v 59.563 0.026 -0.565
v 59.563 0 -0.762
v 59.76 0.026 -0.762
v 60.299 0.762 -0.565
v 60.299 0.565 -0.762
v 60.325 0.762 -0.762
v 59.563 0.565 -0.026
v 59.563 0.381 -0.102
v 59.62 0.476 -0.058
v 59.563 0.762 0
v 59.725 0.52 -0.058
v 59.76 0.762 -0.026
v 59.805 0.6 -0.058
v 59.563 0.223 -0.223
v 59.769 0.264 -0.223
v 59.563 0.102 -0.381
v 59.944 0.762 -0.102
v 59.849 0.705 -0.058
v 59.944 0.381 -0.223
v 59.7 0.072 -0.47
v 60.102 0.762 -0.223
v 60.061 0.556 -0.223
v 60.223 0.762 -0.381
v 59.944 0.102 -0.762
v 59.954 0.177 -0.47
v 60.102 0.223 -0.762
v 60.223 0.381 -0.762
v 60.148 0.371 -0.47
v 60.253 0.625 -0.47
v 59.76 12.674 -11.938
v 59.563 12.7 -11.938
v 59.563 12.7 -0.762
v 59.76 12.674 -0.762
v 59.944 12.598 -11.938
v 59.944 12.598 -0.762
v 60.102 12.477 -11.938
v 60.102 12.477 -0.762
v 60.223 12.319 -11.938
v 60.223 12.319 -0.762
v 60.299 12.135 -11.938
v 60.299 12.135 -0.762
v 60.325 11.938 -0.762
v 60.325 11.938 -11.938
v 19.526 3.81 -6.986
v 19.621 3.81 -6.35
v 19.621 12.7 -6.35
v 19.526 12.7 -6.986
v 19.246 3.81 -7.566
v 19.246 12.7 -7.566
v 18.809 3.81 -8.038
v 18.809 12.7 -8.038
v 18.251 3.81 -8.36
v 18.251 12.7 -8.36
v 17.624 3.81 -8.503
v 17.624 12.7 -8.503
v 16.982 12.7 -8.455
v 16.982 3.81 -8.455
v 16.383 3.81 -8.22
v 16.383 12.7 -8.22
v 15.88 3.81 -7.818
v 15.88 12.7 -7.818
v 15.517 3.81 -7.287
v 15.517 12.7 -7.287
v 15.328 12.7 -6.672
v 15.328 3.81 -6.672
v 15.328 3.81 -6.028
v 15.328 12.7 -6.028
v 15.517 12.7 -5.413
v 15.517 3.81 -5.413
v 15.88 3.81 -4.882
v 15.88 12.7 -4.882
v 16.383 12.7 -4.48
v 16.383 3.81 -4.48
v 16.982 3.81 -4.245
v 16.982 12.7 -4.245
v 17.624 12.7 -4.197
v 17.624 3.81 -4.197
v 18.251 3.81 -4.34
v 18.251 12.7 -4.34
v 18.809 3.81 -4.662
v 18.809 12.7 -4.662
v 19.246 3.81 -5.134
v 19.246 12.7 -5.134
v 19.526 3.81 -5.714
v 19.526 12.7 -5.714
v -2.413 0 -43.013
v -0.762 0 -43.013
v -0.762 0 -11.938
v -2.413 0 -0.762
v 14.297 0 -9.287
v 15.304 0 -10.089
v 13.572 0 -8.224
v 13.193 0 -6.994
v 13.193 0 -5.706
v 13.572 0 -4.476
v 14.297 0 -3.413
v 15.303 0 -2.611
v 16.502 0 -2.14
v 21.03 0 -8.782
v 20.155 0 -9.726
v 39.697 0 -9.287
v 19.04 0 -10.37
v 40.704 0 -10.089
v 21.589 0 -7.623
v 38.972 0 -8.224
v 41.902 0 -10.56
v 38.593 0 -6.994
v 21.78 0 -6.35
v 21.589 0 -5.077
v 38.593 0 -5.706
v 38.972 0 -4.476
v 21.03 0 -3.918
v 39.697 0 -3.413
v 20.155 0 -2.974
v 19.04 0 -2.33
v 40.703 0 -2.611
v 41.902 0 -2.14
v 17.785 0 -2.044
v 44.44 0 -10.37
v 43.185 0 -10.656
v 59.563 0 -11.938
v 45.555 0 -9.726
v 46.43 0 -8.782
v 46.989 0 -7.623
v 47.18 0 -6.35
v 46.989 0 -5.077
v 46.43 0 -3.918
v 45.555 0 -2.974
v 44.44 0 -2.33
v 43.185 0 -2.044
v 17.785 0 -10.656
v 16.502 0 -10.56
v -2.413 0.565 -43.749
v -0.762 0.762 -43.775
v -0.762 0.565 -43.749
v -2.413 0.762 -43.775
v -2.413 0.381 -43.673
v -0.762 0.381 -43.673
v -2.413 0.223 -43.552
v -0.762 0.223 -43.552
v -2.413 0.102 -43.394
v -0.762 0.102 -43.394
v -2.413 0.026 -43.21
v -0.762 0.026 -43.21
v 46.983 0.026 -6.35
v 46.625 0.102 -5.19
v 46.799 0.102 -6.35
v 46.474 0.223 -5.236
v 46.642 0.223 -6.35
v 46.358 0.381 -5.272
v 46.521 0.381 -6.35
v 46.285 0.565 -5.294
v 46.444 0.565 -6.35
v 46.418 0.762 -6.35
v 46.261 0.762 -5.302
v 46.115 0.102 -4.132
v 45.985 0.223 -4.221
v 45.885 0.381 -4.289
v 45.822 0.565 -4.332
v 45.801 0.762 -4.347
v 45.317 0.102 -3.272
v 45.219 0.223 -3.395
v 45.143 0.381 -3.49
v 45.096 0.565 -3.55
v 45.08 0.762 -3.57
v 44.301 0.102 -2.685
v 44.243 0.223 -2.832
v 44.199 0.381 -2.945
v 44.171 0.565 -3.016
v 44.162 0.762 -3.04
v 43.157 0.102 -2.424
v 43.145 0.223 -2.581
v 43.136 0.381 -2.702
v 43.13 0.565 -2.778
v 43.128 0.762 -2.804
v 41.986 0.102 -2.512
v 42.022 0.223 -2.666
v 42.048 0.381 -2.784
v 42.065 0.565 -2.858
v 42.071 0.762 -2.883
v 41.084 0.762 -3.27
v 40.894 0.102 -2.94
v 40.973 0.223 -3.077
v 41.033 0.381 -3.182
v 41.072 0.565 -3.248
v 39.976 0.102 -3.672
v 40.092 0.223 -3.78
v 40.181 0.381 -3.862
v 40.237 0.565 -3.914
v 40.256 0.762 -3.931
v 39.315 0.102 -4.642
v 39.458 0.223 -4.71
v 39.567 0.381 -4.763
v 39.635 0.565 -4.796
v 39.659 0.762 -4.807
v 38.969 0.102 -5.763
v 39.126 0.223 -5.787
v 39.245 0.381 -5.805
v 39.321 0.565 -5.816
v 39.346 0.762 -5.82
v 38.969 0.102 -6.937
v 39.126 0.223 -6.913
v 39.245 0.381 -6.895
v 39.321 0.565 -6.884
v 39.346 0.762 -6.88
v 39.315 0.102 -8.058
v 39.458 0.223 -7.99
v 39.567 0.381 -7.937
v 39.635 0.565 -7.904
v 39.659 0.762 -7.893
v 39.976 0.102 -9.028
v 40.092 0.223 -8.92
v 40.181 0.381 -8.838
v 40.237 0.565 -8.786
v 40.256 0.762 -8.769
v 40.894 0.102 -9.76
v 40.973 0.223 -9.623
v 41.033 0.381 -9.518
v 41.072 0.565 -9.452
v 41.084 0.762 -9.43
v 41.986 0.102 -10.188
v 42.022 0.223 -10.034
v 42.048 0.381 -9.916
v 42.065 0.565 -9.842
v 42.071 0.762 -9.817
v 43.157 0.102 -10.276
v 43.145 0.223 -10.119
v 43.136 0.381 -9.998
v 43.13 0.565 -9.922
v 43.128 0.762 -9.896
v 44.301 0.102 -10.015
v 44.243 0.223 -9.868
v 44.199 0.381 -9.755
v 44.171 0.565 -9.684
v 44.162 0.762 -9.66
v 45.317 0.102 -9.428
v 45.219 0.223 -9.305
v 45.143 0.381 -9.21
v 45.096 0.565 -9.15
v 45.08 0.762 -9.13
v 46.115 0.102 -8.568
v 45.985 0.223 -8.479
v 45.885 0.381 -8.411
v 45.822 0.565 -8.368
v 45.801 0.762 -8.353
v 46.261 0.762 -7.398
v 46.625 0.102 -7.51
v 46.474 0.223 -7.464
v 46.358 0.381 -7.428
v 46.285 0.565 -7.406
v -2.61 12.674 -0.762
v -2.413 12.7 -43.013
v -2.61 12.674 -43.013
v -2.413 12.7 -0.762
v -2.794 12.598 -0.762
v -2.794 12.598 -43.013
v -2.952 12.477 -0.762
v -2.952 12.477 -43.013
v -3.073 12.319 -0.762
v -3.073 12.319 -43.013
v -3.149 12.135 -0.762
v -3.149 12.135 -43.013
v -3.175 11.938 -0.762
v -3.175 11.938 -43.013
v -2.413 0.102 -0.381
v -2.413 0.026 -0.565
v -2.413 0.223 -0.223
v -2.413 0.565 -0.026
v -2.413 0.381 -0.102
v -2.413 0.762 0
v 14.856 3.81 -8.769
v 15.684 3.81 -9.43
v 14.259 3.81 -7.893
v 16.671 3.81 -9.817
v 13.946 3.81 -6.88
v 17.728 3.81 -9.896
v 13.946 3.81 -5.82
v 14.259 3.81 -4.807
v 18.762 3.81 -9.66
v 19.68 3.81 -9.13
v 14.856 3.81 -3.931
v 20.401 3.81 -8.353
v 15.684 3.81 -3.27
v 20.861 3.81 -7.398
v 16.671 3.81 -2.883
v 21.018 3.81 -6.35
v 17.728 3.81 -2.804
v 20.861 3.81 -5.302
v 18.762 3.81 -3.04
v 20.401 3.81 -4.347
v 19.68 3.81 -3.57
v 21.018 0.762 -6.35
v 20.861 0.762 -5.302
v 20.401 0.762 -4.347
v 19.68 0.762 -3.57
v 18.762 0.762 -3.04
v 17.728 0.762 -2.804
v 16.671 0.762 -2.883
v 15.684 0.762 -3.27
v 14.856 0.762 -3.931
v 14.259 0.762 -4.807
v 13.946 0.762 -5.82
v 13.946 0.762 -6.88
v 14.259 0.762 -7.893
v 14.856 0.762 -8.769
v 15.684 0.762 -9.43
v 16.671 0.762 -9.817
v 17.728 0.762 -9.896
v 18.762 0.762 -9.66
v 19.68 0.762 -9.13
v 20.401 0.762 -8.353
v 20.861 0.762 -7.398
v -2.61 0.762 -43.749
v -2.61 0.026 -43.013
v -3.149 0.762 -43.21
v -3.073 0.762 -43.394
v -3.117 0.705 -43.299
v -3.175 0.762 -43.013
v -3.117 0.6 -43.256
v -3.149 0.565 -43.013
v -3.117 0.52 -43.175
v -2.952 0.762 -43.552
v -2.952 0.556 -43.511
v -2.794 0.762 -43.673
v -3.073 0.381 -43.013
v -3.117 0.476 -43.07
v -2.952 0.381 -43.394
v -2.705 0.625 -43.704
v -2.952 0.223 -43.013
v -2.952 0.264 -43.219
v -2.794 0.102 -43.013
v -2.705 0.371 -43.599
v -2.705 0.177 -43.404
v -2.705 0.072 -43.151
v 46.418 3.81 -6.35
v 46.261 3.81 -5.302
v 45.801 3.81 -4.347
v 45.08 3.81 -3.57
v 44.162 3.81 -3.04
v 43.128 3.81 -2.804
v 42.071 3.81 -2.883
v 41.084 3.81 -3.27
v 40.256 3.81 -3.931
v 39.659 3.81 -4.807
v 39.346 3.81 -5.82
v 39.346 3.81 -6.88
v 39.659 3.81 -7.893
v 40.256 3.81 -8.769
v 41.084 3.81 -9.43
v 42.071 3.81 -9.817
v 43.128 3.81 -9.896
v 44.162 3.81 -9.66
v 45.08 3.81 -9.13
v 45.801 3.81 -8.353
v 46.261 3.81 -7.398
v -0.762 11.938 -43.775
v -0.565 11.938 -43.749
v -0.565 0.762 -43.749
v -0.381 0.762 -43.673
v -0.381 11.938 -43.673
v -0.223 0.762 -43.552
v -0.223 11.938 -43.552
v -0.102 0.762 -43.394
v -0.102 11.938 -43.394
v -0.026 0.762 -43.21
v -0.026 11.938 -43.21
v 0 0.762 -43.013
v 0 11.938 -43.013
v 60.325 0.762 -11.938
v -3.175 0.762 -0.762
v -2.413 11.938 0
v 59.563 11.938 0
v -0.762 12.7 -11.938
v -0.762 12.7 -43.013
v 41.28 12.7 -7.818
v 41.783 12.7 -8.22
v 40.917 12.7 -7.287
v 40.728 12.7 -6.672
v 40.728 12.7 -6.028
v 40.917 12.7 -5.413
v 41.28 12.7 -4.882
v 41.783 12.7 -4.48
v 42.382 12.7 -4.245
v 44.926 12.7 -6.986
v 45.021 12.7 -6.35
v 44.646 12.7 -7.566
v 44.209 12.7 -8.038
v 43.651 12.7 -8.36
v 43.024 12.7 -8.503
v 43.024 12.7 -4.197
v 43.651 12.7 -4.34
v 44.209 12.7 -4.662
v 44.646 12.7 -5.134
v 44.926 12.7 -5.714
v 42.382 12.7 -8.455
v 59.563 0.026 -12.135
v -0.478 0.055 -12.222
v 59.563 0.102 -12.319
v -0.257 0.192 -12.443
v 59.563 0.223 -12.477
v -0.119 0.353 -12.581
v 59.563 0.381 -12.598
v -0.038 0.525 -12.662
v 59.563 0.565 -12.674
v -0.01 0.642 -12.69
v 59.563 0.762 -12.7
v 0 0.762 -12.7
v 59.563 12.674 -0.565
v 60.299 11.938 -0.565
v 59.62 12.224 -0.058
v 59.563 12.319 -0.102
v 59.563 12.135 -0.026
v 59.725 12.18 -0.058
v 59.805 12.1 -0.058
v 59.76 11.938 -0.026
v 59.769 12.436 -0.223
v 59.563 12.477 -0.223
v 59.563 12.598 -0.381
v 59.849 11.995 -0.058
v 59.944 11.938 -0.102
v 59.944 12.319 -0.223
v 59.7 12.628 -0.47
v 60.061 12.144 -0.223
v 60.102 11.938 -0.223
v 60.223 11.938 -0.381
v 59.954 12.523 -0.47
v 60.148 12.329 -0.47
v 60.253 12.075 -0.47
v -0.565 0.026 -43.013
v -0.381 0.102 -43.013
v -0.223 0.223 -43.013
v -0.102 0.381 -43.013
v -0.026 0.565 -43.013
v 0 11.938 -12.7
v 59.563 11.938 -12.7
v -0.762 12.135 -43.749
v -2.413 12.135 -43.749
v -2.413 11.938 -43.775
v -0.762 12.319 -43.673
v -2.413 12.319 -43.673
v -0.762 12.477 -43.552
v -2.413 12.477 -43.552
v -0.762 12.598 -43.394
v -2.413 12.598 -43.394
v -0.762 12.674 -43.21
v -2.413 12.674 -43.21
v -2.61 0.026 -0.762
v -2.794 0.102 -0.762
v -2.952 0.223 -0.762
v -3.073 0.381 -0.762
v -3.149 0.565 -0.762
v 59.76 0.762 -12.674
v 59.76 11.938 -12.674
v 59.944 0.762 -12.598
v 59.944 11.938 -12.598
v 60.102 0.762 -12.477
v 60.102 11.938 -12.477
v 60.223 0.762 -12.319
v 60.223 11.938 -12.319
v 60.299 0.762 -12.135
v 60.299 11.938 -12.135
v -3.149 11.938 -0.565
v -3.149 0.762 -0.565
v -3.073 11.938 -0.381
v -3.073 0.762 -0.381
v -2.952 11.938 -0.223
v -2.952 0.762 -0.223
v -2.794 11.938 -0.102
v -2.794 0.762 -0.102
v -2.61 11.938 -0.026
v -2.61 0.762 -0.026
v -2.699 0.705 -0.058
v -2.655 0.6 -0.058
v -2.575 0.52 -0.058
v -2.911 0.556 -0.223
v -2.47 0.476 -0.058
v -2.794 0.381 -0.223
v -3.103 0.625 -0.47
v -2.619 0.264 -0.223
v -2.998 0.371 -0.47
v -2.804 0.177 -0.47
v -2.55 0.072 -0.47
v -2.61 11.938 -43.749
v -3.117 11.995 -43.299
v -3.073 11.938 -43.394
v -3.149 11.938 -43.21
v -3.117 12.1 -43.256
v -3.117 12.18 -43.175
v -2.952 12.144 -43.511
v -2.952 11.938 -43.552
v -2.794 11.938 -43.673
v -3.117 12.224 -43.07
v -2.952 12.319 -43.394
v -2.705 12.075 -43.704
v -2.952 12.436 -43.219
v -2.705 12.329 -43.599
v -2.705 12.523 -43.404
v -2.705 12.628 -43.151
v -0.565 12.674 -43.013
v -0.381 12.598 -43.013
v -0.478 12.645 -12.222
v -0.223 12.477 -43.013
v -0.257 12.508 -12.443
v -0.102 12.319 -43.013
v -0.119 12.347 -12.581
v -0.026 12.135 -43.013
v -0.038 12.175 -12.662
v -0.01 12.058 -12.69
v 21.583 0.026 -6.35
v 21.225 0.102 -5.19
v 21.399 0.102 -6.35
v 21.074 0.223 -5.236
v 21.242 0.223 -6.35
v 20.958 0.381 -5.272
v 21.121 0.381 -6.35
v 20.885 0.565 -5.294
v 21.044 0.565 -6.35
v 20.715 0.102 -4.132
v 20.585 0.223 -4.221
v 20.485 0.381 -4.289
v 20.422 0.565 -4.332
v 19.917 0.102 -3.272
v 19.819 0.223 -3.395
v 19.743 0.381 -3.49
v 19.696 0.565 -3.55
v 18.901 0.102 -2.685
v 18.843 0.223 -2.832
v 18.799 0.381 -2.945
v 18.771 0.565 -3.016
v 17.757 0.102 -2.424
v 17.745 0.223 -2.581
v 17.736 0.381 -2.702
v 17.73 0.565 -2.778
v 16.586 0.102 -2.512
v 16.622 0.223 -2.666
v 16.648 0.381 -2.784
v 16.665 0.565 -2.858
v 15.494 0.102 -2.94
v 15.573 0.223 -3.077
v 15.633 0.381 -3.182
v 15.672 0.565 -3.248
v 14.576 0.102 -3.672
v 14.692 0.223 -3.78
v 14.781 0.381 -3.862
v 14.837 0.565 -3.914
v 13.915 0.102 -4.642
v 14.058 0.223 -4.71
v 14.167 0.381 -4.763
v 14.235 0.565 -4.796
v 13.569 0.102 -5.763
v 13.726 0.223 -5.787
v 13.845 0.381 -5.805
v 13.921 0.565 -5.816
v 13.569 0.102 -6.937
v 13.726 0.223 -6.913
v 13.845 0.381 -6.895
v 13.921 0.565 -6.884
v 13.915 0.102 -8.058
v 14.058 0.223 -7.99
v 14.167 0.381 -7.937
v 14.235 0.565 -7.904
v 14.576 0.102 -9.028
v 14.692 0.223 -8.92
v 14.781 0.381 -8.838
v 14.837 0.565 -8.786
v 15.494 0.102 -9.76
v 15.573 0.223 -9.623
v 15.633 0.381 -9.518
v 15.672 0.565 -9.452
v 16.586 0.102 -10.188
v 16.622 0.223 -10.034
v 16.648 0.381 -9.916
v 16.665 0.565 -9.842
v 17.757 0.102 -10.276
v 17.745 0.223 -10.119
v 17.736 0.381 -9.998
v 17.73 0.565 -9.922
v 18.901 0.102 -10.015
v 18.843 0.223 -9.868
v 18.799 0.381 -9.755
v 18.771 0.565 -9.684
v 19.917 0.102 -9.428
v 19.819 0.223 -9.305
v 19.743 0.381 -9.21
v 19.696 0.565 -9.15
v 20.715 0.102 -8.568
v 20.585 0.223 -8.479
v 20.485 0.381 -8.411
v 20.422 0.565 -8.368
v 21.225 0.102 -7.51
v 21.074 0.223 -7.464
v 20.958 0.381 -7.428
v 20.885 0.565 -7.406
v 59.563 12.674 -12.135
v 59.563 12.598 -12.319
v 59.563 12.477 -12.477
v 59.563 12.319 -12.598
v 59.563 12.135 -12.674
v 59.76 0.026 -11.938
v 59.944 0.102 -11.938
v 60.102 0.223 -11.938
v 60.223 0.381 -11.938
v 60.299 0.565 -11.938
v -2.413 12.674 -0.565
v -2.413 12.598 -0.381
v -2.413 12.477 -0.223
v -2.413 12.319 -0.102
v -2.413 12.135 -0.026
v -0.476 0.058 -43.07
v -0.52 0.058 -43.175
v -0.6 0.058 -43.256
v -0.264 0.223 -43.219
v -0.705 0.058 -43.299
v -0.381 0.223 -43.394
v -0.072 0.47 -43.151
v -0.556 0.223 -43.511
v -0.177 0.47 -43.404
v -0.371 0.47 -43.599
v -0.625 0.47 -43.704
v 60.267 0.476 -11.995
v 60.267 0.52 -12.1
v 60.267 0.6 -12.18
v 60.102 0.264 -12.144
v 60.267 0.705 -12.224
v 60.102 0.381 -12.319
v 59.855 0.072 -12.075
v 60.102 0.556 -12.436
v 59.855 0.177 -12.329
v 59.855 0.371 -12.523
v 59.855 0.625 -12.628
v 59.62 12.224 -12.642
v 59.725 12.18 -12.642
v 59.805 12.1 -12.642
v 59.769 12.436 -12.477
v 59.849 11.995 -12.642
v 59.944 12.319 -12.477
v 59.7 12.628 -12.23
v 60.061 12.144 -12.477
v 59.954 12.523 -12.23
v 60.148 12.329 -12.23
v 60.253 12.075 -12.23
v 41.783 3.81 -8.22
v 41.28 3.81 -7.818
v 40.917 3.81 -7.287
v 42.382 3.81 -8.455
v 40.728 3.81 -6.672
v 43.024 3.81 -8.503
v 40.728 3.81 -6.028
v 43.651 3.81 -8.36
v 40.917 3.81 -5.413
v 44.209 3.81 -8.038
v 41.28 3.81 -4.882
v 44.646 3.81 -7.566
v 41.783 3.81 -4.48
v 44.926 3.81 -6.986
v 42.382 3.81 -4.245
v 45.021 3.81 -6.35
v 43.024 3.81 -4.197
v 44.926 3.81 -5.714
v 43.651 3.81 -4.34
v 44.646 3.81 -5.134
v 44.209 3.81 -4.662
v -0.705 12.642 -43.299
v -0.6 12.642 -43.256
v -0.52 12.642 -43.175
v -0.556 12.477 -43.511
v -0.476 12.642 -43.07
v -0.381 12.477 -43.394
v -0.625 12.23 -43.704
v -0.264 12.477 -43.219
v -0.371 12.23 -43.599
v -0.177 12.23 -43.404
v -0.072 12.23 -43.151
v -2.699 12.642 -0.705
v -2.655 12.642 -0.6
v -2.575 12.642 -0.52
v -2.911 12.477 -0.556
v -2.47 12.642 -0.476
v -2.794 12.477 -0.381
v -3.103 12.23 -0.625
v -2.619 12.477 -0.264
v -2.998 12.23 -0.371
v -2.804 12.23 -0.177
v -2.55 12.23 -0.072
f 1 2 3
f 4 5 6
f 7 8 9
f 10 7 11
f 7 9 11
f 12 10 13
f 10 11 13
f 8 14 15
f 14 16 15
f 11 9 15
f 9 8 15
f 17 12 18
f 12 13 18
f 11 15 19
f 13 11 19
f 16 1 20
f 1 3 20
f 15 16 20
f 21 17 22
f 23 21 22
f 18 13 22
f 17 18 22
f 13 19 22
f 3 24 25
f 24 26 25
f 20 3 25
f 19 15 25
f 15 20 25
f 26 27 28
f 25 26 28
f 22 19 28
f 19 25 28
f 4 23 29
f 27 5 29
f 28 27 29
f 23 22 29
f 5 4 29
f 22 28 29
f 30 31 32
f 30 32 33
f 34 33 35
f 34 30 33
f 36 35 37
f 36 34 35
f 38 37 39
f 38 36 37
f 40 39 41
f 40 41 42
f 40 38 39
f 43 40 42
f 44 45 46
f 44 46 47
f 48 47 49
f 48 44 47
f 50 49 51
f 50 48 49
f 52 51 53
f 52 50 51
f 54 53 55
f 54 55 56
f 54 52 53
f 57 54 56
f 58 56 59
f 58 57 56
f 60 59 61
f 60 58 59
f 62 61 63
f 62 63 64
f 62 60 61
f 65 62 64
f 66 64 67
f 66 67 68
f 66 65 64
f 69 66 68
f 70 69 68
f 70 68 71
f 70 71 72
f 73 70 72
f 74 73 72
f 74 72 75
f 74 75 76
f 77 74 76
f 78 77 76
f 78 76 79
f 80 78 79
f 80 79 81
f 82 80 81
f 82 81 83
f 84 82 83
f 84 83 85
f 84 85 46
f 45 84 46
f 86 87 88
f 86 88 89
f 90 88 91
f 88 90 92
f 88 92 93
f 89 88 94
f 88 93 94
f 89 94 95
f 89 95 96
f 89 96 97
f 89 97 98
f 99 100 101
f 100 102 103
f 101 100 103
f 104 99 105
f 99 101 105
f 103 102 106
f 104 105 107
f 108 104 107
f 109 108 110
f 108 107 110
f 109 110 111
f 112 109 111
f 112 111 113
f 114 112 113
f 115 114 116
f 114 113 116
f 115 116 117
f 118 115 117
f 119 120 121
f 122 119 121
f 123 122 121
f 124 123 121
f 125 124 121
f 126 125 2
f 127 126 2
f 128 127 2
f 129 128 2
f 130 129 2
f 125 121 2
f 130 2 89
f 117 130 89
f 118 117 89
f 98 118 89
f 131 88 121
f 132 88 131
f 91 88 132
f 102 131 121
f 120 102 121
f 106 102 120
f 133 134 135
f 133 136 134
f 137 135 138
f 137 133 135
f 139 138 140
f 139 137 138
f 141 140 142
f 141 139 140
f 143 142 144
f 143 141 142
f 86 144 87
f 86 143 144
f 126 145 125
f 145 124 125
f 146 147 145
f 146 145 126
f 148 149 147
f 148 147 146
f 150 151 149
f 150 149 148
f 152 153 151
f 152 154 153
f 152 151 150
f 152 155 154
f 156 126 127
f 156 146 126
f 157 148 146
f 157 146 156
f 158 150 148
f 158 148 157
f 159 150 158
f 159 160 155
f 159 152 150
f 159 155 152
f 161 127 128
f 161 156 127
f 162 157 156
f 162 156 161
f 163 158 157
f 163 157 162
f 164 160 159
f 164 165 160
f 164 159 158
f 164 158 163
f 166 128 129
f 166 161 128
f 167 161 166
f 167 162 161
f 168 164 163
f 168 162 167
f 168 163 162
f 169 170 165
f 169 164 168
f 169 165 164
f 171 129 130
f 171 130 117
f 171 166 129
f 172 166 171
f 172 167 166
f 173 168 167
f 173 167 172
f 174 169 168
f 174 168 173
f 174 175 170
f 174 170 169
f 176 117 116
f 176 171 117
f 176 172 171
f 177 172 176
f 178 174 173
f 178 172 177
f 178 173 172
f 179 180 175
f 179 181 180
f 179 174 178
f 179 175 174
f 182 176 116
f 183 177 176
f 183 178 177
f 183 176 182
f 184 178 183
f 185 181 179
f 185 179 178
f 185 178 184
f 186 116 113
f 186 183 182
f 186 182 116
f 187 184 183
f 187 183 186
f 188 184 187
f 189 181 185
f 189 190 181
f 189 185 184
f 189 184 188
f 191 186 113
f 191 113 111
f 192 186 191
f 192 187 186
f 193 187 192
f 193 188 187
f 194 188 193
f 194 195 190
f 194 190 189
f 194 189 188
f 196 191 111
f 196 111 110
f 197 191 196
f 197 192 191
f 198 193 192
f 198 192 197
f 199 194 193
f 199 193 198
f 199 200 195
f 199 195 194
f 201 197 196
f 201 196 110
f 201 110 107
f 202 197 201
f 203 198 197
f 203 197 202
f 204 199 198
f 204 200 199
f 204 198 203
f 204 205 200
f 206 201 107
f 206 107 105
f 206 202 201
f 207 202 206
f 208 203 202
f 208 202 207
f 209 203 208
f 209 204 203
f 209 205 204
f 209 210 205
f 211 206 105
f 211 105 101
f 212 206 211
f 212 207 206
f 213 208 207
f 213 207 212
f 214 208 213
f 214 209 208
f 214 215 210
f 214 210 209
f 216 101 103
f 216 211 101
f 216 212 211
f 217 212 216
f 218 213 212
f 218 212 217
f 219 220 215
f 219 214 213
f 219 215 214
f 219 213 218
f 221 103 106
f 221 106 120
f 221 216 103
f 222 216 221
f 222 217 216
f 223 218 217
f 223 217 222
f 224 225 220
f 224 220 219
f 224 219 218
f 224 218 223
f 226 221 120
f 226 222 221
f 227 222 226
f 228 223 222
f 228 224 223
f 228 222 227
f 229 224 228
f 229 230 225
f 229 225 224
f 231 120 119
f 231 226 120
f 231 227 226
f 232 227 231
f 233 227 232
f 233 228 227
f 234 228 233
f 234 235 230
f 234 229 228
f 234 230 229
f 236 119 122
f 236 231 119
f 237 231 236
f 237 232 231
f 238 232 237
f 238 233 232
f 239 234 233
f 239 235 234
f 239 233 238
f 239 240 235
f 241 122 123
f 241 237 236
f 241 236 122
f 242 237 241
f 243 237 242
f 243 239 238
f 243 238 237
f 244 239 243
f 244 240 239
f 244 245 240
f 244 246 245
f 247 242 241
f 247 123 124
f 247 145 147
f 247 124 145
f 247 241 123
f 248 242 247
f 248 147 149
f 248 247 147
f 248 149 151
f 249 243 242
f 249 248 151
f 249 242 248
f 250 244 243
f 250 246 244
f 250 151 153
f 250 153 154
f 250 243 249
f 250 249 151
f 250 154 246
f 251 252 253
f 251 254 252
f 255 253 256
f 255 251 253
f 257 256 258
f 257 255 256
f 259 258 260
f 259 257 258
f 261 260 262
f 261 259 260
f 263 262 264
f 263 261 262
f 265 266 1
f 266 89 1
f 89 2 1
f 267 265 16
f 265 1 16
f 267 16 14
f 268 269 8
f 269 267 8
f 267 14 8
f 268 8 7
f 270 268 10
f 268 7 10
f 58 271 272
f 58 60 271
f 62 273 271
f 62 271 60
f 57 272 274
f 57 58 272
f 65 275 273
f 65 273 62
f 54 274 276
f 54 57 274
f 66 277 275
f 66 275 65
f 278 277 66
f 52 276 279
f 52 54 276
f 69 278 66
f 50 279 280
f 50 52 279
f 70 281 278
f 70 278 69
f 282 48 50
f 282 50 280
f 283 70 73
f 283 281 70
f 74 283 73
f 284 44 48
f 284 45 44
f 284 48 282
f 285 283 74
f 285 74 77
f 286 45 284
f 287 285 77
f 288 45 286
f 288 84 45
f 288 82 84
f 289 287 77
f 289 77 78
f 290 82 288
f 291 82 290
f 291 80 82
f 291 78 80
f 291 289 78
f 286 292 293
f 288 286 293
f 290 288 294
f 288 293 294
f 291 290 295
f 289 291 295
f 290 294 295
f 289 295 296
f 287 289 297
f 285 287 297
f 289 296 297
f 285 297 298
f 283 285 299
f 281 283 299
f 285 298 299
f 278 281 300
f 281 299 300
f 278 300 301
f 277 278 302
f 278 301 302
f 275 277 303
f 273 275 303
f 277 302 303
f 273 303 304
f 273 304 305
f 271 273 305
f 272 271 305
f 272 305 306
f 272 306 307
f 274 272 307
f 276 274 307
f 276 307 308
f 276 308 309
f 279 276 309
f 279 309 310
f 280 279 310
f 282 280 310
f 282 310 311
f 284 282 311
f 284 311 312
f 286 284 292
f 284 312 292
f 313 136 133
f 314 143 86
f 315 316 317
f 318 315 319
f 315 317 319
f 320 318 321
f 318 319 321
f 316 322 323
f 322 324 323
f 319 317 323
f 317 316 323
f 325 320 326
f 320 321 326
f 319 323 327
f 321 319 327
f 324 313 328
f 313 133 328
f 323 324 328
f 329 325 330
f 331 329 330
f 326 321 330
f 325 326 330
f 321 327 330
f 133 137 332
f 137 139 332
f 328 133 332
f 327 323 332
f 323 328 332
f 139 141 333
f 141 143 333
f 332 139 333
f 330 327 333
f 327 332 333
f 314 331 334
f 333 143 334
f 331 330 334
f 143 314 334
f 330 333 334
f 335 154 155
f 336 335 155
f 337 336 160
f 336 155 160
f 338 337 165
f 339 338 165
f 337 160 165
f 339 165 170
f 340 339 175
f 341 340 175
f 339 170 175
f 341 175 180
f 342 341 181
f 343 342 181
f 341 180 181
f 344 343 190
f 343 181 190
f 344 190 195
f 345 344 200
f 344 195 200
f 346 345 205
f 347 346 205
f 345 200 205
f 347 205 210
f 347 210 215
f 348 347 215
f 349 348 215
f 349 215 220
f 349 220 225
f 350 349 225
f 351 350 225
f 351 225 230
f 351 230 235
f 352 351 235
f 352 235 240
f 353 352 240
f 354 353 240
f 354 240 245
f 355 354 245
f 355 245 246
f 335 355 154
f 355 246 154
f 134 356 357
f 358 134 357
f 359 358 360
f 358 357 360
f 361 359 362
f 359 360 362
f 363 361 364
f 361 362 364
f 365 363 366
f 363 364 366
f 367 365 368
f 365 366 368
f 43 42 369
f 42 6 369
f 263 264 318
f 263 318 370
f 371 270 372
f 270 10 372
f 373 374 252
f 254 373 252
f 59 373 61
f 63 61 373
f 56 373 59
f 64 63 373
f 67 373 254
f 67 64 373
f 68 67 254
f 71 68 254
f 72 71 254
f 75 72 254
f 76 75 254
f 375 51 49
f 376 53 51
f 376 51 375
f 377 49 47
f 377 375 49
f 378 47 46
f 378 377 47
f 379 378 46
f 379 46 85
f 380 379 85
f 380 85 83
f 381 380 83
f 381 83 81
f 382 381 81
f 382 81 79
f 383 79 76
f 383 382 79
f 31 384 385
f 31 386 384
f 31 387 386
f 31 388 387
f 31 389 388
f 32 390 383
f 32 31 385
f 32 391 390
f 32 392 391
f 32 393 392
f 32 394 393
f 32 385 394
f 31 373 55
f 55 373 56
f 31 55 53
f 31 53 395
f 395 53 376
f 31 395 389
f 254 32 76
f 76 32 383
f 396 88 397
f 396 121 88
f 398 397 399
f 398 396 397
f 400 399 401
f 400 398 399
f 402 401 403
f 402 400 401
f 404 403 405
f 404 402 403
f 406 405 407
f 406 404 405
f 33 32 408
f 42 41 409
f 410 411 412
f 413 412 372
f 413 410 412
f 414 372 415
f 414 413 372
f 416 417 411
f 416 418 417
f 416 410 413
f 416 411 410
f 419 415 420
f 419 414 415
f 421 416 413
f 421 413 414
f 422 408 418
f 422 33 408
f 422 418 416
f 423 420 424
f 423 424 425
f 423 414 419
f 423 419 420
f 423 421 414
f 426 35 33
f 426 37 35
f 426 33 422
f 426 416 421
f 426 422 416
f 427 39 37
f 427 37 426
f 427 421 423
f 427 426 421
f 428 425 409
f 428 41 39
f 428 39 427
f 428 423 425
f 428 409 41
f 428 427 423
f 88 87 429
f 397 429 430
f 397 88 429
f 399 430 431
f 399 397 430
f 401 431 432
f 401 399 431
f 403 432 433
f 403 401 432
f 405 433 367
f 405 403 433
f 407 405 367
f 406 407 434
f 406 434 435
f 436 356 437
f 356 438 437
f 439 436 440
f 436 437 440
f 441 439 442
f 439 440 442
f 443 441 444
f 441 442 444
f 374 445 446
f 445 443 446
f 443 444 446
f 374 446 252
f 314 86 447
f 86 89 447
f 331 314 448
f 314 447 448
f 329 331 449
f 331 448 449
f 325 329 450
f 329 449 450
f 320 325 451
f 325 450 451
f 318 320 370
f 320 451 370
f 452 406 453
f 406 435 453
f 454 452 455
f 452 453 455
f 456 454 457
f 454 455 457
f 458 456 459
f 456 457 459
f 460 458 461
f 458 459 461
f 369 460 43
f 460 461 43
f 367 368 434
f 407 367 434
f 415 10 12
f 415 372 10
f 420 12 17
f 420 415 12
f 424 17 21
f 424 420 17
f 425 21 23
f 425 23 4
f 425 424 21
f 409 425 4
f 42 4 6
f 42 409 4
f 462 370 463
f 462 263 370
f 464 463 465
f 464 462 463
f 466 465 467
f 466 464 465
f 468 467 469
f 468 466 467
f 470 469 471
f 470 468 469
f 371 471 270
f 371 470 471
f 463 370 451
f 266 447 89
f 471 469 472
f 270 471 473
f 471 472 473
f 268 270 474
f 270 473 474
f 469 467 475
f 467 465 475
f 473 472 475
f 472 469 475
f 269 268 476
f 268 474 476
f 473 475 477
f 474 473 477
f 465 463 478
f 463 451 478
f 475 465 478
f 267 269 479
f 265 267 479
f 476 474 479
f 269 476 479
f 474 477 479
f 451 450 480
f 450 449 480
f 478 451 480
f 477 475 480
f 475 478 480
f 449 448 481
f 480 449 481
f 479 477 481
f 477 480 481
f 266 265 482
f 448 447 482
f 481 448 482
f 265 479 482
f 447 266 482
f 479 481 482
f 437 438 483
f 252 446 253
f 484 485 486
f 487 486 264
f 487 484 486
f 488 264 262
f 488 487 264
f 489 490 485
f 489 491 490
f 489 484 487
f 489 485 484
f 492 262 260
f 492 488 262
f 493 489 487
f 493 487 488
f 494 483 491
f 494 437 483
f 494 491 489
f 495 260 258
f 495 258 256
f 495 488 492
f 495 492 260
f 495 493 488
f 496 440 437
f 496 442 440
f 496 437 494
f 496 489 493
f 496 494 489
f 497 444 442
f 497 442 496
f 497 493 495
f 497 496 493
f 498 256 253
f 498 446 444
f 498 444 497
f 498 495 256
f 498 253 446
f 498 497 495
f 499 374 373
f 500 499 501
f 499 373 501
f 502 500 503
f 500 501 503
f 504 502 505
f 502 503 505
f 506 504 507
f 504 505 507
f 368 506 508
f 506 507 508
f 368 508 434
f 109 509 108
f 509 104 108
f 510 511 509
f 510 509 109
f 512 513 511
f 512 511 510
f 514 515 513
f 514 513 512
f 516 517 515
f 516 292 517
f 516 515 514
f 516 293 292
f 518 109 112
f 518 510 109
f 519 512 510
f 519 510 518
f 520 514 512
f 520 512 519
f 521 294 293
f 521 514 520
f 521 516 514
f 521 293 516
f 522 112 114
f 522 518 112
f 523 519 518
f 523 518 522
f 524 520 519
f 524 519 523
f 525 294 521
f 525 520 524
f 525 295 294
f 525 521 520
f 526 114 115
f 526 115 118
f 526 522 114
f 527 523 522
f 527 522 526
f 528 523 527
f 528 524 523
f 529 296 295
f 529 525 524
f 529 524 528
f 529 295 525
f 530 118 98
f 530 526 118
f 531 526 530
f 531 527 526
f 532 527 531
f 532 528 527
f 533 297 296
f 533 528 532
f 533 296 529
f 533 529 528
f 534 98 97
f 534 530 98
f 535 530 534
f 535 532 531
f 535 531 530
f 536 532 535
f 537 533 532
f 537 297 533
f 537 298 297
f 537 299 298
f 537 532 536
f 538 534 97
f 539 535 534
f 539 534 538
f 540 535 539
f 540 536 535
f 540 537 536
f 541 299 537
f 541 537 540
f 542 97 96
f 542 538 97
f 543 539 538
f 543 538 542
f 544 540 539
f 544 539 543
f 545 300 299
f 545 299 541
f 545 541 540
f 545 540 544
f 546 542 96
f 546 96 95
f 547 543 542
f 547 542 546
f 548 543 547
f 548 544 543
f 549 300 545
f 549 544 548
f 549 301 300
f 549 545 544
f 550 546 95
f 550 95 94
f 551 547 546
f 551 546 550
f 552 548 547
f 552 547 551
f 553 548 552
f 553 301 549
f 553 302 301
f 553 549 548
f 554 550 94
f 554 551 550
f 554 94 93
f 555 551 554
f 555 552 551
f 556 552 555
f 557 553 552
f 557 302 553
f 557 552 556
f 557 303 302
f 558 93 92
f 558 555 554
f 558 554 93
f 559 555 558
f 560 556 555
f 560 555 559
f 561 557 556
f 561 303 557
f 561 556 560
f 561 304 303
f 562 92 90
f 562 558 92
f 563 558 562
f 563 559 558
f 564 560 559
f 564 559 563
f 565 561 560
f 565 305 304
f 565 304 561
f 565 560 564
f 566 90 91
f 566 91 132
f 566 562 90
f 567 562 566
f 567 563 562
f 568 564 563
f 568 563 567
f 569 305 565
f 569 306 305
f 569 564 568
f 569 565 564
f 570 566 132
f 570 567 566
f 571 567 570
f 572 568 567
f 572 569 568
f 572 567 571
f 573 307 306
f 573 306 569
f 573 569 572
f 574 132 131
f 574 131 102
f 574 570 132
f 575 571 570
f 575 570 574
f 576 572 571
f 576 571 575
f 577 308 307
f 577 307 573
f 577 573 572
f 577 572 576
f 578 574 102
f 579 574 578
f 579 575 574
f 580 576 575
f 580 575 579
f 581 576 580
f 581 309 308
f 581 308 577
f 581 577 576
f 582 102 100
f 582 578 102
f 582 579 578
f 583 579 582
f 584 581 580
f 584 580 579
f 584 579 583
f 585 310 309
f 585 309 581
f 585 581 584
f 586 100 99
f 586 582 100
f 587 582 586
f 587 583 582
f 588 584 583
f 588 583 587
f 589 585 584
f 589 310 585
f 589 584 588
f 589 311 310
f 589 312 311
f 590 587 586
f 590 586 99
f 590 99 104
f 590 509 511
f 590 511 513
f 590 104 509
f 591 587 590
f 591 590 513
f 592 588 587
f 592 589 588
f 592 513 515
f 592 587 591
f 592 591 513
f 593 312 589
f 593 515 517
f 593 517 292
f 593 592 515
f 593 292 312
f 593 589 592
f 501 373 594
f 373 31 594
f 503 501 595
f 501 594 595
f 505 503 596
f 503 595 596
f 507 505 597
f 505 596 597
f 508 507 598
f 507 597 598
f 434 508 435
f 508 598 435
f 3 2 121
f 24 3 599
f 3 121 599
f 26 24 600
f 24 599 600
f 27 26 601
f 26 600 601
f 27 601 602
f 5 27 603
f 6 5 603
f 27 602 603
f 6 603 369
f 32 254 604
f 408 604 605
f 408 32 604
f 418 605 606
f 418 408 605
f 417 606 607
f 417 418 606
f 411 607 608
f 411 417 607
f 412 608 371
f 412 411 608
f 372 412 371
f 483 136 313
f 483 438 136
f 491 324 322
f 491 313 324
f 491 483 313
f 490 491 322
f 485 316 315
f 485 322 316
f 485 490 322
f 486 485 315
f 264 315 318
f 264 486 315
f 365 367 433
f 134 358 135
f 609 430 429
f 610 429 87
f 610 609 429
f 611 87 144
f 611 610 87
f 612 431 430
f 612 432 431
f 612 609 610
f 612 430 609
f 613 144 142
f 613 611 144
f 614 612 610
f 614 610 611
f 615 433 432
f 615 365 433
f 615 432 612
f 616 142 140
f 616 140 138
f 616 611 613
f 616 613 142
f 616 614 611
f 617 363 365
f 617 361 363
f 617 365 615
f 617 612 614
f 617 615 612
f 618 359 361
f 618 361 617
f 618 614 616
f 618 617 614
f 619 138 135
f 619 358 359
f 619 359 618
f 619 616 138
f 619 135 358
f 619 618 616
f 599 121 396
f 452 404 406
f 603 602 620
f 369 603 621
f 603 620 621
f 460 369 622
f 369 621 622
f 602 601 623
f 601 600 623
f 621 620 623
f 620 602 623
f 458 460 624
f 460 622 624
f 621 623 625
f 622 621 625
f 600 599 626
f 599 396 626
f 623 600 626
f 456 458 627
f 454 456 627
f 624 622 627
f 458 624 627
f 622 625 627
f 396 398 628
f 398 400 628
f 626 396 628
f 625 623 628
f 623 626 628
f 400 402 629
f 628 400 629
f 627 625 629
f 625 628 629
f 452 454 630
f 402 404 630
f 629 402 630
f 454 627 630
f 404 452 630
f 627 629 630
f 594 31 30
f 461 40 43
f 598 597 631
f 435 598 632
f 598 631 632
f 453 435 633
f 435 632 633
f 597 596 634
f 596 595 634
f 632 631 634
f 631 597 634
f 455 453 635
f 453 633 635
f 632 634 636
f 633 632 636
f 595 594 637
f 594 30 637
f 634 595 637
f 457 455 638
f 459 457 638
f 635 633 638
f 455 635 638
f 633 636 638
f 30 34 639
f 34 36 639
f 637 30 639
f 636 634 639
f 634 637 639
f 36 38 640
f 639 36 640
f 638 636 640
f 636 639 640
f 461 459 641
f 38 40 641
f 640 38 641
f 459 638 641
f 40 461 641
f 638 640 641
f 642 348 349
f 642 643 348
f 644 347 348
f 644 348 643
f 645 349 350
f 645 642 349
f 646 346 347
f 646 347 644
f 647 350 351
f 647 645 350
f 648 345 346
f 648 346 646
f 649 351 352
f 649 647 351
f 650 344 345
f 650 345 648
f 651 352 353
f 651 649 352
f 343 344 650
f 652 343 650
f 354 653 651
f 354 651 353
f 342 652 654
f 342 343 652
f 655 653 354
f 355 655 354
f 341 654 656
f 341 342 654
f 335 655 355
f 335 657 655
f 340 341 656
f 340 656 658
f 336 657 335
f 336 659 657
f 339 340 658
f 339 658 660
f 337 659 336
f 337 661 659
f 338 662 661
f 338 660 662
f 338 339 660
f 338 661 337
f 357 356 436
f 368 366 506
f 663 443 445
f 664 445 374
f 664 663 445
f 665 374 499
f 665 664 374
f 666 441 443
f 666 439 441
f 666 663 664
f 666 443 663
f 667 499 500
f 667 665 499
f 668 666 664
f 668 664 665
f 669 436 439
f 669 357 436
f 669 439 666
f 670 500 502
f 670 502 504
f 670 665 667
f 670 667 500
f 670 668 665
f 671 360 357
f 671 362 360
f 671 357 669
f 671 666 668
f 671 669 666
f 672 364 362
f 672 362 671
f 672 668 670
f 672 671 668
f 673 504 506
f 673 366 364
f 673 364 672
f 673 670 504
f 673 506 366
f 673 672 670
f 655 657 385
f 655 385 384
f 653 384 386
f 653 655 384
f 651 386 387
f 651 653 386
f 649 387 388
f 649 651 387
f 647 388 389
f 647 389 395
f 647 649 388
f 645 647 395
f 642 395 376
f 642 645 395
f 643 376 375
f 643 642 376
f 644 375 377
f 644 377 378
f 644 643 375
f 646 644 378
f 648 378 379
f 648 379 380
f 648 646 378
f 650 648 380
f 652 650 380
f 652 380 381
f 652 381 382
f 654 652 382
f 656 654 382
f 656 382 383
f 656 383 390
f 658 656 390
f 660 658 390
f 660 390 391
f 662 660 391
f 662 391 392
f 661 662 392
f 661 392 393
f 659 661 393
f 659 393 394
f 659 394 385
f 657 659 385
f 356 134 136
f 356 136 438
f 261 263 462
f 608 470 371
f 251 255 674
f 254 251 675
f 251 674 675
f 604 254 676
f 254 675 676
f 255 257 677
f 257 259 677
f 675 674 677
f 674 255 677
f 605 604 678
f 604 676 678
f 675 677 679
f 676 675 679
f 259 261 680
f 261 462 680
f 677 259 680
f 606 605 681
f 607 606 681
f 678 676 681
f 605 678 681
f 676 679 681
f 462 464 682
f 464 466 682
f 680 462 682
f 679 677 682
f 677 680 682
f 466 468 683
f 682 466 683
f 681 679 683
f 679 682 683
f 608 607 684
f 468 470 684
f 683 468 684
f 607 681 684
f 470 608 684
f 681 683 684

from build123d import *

# Parameters (mm, degrees)
SKETCH1_W           = 60.325
SKETCH1_H           = 12.7
SKETCH1_R           = 2.159
BOSS_EXTRUDE1_DEPTH = 12.7
SKETCH4_W           = 43.775259309
SKETCH4_H           = 12.7
BOSS_EXTRUDE2_DEPTH = 3.175
SKETCH5_R           = 3.556
CUT_EXTRUDE1_DEPTH  = 3.81
FILLET5_R           = 0.762


with BuildPart() as part:
    # Sketch1 → Boss-Extrude1 (new body)
    with BuildSketch(Plane(origin=(0, 0, 0), x_dir=(1, 0, 0), z_dir=(0, 1, 0))):
        with Locations((30.1625, 6.35)):
            Rectangle(SKETCH1_W, SKETCH1_H)
        with Locations((17.4625, 6.35)):
            Circle(SKETCH1_R, mode=Mode.SUBTRACT)
        with Locations((42.8625, 6.35)):
            Circle(SKETCH1_R, mode=Mode.SUBTRACT)
    extrude(amount=BOSS_EXTRUDE1_DEPTH)

    # Sketch4 → Boss-Extrude2 (add)
    with BuildSketch(Plane.ZY):
        with Locations((-21.887629655, 6.35)):
            Rectangle(SKETCH4_W, SKETCH4_H)
    extrude(amount=BOSS_EXTRUDE2_DEPTH)

    # Sketch5 → Cut-Extrude1 (cut)
    with BuildSketch(Plane.XZ):
        with Locations((42.8625, -6.35)):
            Circle(SKETCH5_R)
        with Locations((17.4625, -6.35)):
            Circle(SKETCH5_R)
    extrude(amount=-CUT_EXTRUDE1_DEPTH, mode=Mode.SUBTRACT)

    # Fillet5
    fillet5_edges = [part.edges().sort_by_distance(p)[0] for p in [
        (60.325, 12.7, -6.35),
        (30.1625, 12.7, -12.7),
        (0, 6.35, -43.775259309),
        (-1.5875, 12.7, -43.775259309),
        (0, 0, -28.237629654),
        (-1.5875, 0, -43.775259309),
        (0, 12.7, -28.237629654),
        (-3.175, 6.35, -43.775259309),
        (-3.175, 0, -21.887629654),
        (-3.175, 6.35, 0),
        (-3.175, 12.7, -21.887629654),
        (39.3065, 0, -6.35),
        (13.9065, 0, -6.35),
        (30.1625, 0, -12.7),
        (60.325, 0, -6.35),
        (28.575, 0, 0),
        (28.575, 12.7, 0),
        (60.325, 6.35, -12.7),
        (60.325, 6.35, 0),
    ]]
    fillet(fillet5_edges, radius=FILLET5_R)


solid = part.part
